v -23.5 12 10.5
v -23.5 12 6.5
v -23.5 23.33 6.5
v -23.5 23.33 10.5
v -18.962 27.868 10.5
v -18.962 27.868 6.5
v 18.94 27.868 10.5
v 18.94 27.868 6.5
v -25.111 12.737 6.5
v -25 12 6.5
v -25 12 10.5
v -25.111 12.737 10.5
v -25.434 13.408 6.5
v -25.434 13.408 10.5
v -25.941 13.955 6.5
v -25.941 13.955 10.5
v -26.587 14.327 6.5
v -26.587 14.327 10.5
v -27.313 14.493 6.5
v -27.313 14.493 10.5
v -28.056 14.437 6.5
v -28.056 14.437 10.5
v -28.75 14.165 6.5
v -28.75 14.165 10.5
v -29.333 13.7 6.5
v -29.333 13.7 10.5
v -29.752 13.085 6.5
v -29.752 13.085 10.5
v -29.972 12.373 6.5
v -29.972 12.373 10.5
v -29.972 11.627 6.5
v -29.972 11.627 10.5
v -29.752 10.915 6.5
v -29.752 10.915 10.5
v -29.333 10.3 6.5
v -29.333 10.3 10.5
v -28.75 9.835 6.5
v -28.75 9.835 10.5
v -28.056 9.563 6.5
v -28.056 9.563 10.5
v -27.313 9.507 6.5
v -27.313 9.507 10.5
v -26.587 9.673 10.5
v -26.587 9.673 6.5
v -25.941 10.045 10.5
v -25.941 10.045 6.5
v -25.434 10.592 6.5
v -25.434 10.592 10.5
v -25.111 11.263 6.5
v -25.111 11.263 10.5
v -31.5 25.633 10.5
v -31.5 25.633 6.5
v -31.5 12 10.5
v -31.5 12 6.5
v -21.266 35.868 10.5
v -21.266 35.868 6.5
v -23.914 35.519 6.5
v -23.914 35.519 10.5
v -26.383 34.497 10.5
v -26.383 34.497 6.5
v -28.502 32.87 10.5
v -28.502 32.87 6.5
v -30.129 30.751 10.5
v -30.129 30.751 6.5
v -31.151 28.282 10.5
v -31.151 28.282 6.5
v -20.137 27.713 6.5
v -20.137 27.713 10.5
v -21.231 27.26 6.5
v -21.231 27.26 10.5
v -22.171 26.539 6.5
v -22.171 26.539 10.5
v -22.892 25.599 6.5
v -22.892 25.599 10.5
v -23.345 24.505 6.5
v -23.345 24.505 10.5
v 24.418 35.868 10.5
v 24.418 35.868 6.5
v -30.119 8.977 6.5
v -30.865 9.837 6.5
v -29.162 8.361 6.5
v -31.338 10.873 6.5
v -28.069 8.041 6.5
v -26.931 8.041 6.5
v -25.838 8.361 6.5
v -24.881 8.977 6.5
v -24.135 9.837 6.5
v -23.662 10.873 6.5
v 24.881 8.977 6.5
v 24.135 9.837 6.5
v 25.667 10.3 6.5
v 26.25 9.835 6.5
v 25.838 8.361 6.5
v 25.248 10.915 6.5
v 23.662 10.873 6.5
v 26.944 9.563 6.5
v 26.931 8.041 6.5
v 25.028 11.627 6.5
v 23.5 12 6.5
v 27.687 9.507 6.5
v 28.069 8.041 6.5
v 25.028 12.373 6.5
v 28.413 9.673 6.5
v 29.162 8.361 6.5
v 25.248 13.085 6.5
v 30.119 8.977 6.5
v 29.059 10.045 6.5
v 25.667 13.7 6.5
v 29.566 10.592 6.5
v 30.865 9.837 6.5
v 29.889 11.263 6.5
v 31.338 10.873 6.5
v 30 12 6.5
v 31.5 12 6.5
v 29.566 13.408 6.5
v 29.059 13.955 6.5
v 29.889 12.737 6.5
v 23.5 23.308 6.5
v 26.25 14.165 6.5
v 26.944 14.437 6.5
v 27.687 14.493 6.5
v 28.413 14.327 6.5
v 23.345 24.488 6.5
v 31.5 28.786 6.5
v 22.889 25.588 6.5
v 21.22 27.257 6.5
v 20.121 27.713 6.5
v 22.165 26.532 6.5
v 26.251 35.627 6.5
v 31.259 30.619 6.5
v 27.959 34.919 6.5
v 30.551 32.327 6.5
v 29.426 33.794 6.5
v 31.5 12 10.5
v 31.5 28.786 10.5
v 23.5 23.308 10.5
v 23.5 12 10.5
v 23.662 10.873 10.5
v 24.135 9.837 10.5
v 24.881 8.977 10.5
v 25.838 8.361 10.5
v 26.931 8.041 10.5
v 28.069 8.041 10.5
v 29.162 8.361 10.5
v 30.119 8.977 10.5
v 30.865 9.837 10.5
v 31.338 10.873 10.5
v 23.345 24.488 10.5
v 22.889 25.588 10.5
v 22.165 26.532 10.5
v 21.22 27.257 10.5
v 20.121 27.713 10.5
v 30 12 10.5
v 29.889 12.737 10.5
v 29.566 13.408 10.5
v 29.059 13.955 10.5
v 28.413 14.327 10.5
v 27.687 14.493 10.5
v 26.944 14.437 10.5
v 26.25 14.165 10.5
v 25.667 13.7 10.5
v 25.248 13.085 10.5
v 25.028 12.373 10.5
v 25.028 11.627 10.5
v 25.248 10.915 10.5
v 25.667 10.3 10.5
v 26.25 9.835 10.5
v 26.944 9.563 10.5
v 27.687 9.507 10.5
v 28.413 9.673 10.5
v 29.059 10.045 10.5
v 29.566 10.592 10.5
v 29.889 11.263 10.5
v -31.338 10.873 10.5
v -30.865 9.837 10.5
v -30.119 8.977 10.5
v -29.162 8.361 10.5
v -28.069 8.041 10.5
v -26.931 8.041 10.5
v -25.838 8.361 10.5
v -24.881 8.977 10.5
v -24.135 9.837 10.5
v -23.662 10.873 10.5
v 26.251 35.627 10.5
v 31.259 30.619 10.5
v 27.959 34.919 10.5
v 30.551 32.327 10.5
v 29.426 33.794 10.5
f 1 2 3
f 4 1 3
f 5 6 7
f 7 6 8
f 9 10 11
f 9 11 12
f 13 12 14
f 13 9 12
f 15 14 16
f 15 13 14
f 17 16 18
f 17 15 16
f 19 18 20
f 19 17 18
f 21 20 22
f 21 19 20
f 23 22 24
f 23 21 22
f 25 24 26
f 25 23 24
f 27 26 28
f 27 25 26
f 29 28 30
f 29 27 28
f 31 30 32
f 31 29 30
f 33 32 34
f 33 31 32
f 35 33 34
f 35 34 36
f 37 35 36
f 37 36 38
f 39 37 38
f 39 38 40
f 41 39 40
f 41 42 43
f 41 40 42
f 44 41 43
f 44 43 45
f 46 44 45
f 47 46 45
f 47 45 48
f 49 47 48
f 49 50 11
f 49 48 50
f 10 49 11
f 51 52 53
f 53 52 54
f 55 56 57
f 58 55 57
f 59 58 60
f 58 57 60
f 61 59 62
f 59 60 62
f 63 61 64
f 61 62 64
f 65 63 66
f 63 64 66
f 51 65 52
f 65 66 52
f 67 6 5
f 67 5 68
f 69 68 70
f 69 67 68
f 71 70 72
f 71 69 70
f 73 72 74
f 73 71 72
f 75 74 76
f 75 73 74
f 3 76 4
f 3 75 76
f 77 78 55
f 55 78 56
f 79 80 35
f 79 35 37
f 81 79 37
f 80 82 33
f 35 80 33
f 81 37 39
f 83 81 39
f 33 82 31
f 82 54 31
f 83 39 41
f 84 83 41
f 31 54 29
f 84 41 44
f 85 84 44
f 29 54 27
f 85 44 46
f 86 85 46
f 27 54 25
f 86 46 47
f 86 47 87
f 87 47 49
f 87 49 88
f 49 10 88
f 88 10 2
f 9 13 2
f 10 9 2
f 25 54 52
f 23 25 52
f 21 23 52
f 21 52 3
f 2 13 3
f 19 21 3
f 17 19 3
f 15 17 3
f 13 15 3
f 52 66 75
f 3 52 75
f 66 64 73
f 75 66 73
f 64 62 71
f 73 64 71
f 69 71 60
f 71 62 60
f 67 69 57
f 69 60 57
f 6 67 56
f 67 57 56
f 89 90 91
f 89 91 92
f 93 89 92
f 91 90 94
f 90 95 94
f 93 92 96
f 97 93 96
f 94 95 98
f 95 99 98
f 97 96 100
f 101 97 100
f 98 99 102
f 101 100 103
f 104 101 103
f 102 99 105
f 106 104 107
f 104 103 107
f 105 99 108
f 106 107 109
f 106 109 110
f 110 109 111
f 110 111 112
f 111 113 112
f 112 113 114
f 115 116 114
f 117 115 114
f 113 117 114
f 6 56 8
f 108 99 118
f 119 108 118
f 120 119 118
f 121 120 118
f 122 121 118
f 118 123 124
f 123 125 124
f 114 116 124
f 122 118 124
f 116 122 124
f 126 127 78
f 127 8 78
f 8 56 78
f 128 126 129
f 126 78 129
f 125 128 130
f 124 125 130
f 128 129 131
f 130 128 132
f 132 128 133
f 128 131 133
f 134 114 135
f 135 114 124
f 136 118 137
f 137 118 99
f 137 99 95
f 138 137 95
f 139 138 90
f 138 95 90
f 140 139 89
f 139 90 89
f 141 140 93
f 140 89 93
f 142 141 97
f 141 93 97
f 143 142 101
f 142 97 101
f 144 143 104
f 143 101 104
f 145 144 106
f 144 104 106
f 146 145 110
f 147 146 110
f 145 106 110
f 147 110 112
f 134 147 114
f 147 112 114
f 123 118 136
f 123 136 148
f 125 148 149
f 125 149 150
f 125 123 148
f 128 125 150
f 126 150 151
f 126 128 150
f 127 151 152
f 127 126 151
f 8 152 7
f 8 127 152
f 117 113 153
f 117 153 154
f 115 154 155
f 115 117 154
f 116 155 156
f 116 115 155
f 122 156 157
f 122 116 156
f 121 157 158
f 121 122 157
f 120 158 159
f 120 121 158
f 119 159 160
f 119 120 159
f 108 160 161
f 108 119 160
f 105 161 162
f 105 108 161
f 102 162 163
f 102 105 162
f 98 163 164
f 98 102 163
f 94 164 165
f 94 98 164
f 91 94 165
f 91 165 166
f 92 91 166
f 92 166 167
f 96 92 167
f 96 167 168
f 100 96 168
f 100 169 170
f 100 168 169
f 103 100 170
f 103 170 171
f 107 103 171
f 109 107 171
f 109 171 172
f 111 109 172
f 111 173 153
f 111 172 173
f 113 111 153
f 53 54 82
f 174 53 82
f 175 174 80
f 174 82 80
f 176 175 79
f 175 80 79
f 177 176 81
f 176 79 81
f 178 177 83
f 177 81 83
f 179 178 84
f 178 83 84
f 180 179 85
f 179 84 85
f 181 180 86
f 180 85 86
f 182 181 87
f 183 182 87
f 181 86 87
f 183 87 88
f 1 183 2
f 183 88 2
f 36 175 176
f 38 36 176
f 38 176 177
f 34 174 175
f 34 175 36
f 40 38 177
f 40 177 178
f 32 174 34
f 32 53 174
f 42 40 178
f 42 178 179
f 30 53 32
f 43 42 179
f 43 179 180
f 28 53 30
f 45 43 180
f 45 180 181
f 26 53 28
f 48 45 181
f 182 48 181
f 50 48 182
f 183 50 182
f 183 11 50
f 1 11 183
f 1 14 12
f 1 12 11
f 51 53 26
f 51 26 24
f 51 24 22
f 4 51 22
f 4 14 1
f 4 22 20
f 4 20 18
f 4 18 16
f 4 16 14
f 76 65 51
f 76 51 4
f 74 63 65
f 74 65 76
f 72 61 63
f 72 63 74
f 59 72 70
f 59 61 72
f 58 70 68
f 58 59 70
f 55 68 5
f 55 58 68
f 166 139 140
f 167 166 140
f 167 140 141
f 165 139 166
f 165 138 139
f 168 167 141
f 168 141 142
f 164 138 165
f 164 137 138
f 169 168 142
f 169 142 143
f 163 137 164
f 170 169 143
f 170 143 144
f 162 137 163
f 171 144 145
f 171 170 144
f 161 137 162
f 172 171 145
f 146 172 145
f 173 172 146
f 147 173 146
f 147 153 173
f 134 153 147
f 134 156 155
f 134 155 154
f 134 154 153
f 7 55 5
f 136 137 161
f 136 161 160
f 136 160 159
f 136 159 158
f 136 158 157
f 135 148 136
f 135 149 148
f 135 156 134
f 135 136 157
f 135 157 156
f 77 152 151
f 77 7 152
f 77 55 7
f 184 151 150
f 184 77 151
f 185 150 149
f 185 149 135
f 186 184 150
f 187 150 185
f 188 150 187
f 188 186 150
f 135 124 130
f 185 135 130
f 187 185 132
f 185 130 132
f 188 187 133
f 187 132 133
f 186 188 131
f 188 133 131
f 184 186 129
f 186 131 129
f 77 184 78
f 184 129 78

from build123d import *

# Parameters (mm, degrees)
CYLINDER011_R     = 2.5
CYLINDER011_DEPTH = 7.5
CYLINDER010_R     = 2.5
CYLINDER010_DEPTH = 7.5
EXTRUDE_DEPTH     = 4


with BuildPart() as cilindro010:
    # Cylinder011 → Cylinder011 (new body)
    with BuildSketch(Plane(origin=(27.5, 12, 5), x_dir=(1, 0, 0), z_dir=(0, 0, 1))):
        Circle(CYLINDER011_R)
    extrude(amount=CYLINDER011_DEPTH)


with BuildPart() as fusion002:
    # Cylinder010 → Cylinder010 (new body)
    with BuildSketch(Plane(origin=(-27.5, 12, 5), x_dir=(1, 0, 0), z_dir=(0, 0, 1))):
        Circle(CYLINDER010_R)
    extrude(amount=CYLINDER010_DEPTH)

    # Fusion002: union Cilindro010
    add(cilindro010.part)


with BuildPart() as barra_dir:
    # Sketch003 (on Face2 of Cylinder008) → Extrude (new body)
    with BuildSketch(Plane(origin=(0, 12, 1.5), x_dir=(1, 0, 0), z_dir=(0, 0, 1))):
        with BuildLine():
            Line((-23.5, 0), (-23.5, 11.330372))
            ThreePointArc((-18.962486, 15.867886), (-22.170993, 14.538879), (-23.5, 11.330372))
            Line((-18.962486, 15.867886), (18.940419, 15.867886))
            ThreePointArc((23.5, 11.308305), (22.16453, 14.532416), (18.940419, 15.867886))
            Line((23.5, 11.308305), (23.5, 0))
            ThreePointArc((23.5, 0), (27.5, -4), (31.5, 0))
            Line((31.5, 0), (31.5, 16.785542))
            ThreePointArc((31.5, 16.785542), (29.425629, 21.793515), (24.417656, 23.867886))
            Line((24.417656, 23.867886), (-21.265535, 23.867886))
            ThreePointArc((-21.265535, 23.867886), (-28.502395, 20.870281), (-31.5, 13.633421))
            Line((-31.5, 13.633421), (-31.5, 0))
            ThreePointArc((-31.5, 0), (-27.5, -4), (-23.5, 0))
        make_face()
    extrude(amount=EXTRUDE_DEPTH)


with BuildPart() as barra_dir_1:
    # Extrude placement: moved
    add(barra_dir.part.moved(Location((0, 0, 5))))

    # Cut002: cut Fusion002
    add(fusion002.part, mode=Mode.SUBTRACT)


solid = barra_dir_1.part
